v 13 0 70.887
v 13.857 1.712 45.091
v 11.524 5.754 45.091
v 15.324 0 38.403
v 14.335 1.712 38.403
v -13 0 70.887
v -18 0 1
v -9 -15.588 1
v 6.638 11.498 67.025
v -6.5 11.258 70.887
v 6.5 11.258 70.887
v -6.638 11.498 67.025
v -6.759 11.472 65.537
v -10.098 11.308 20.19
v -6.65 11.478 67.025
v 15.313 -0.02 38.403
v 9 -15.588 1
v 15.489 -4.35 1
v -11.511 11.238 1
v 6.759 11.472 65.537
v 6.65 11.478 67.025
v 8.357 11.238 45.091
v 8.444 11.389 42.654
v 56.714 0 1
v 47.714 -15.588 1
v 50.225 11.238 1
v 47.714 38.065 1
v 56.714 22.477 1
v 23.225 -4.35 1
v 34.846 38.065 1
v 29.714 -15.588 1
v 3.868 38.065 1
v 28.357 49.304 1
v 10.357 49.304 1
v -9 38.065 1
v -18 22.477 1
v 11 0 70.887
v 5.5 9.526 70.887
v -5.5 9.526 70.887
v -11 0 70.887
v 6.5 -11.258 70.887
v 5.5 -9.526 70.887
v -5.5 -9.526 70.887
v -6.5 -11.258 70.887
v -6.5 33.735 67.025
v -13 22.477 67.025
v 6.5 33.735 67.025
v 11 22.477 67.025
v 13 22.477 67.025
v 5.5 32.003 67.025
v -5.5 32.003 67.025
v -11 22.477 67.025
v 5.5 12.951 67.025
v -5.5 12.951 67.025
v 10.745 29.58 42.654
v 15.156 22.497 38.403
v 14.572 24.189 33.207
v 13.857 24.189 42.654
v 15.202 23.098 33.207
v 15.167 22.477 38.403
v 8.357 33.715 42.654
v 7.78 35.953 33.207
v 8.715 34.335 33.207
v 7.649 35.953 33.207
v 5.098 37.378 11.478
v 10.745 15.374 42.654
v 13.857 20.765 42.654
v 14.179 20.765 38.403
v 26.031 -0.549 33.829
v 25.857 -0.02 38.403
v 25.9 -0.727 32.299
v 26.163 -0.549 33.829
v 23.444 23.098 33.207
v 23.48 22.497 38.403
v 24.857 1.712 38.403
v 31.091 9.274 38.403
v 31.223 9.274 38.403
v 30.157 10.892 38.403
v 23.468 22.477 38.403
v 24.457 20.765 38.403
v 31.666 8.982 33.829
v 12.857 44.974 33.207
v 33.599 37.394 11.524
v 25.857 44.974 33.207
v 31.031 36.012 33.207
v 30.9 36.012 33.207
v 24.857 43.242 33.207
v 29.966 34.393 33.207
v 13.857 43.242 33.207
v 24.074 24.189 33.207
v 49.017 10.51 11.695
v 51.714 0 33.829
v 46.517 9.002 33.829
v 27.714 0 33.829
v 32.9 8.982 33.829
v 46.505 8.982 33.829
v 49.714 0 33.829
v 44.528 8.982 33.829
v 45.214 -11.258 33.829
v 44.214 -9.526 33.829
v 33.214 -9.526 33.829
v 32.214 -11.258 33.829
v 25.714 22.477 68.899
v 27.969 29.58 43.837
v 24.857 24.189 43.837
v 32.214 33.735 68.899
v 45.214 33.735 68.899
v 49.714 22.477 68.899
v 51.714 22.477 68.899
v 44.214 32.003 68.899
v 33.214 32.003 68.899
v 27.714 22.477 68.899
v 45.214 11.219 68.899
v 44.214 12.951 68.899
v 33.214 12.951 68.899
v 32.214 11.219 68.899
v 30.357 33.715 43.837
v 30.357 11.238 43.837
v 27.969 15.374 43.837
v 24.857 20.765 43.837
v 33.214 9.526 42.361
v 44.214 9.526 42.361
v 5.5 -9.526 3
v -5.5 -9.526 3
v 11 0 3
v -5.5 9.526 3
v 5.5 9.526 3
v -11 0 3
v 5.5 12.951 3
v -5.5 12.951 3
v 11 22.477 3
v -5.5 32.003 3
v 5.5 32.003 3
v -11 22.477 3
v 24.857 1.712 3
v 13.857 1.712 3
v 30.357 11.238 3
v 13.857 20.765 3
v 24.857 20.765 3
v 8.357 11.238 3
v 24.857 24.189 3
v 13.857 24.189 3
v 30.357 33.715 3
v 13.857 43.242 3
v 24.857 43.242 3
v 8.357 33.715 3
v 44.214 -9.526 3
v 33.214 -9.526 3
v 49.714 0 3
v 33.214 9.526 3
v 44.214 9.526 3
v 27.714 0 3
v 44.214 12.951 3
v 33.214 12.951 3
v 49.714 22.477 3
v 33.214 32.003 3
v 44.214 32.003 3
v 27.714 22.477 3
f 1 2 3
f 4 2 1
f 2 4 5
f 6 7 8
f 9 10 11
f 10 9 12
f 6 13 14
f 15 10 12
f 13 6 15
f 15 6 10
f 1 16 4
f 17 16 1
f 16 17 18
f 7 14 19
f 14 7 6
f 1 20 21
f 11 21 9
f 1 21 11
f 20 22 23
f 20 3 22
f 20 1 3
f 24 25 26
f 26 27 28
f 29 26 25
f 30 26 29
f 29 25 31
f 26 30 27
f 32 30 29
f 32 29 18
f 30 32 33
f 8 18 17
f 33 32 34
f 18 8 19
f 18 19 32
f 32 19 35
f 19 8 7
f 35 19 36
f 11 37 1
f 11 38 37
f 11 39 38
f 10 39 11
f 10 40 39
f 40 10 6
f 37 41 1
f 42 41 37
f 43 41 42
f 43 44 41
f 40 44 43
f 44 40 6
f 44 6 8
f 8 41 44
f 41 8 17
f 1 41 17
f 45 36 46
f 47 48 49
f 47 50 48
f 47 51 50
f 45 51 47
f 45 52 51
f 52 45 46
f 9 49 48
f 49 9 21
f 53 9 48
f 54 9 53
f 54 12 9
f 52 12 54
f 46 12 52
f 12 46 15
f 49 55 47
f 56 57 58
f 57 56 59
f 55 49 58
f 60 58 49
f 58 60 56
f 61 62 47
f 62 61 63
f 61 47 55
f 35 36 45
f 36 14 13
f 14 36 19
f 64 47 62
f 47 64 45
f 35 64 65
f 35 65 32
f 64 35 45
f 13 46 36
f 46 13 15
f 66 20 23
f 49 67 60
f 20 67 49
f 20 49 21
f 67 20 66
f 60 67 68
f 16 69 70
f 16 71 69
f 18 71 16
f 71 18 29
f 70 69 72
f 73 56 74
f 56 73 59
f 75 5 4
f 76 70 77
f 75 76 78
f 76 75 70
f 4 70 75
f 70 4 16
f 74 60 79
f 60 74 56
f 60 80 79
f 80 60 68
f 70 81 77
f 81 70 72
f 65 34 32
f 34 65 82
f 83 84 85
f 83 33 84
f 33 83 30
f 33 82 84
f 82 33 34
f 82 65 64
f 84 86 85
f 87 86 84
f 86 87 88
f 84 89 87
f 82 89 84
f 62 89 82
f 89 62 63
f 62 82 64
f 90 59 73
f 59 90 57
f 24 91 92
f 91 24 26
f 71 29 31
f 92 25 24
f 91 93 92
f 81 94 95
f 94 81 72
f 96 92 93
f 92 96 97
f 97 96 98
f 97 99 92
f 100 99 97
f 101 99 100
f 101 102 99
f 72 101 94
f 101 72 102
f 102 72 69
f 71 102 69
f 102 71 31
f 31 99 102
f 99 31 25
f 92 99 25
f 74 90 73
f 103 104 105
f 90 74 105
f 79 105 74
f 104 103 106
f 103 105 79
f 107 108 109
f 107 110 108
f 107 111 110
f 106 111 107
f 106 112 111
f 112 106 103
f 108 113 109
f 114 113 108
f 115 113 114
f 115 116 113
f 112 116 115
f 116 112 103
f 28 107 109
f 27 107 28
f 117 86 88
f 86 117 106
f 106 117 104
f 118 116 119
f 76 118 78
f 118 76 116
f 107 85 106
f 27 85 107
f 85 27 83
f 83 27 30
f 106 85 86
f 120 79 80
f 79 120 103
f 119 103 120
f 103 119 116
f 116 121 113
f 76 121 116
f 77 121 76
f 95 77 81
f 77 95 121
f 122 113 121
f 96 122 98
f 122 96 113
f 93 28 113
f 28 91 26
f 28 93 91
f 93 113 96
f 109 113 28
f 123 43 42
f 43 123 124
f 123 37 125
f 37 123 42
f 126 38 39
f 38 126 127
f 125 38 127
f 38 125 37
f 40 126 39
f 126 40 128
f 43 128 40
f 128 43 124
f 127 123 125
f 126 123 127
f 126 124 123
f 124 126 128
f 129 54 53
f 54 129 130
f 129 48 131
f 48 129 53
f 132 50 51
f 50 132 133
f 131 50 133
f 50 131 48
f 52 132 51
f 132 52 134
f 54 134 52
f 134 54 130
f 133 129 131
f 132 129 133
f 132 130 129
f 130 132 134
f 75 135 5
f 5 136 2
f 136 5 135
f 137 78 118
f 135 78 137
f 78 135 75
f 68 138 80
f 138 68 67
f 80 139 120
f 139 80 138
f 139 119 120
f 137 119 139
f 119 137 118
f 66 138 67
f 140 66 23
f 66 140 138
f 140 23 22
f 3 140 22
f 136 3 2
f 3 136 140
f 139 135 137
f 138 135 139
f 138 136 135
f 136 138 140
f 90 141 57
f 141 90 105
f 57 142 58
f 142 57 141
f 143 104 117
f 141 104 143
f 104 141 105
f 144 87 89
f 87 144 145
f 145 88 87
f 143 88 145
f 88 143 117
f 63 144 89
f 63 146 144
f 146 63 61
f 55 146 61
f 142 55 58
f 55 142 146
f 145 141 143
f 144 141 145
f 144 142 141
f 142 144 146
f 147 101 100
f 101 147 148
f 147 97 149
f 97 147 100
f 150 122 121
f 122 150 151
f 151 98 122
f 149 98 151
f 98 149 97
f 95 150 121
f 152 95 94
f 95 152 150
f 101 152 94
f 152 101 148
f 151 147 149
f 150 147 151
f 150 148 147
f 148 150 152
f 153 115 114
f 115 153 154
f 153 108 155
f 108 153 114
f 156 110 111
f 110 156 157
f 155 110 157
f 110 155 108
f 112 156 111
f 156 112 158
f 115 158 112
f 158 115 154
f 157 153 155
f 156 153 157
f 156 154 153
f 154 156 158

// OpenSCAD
/*

Created by Arthur Palmer 30.09.2015

*/

// Amount of tybes in the X-Direction
x_count = 3; 

// Amount of tybes in the Y-Direction
y_count = 2; 

// Random height can be changed here
random_seed = 1;

// Minimum height of the types
min_height = 30;

// Maximum height of the types
max_height = 70;

// Tybe-Radius
radius = 13;

// How thick should the wall be:
thickness = 2;

// Should it be thiker on the bottom?
base_extra = 5;

difference()
{
for ( x = [0:(x_count - 1)])
    for( y = [0:(y_count - 1)])
    {
        zy = (x % 2) * radius * 0.8645;
        translate([x * radius * 1.489, y * radius * 1.729 + zy, 1])
            createBase(rands(min_height, max_height, 1, random_seed + x + x_count * y)[0]);
    }

for ( x = [0:(x_count - 1)])
    for( y = [0:(y_count - 1)])
    {
        zy = (x % 2) * radius * 0.8645;
        translate([x * radius * 1.489, y * radius * 1.729 + zy, 1])
            createHoles(rands(min_height, max_height, 1, random_seed + x + x_count * y)[0]);
    }
}

module createBase(height)
{
    cylinder(height, radius + base_extra, radius, $fn=6);
}

module createHoles(height)
{
    translate([0, 0, thickness])
        cylinder(height+max_height, radius - thickness, radius - thickness, $fn=6);
}
